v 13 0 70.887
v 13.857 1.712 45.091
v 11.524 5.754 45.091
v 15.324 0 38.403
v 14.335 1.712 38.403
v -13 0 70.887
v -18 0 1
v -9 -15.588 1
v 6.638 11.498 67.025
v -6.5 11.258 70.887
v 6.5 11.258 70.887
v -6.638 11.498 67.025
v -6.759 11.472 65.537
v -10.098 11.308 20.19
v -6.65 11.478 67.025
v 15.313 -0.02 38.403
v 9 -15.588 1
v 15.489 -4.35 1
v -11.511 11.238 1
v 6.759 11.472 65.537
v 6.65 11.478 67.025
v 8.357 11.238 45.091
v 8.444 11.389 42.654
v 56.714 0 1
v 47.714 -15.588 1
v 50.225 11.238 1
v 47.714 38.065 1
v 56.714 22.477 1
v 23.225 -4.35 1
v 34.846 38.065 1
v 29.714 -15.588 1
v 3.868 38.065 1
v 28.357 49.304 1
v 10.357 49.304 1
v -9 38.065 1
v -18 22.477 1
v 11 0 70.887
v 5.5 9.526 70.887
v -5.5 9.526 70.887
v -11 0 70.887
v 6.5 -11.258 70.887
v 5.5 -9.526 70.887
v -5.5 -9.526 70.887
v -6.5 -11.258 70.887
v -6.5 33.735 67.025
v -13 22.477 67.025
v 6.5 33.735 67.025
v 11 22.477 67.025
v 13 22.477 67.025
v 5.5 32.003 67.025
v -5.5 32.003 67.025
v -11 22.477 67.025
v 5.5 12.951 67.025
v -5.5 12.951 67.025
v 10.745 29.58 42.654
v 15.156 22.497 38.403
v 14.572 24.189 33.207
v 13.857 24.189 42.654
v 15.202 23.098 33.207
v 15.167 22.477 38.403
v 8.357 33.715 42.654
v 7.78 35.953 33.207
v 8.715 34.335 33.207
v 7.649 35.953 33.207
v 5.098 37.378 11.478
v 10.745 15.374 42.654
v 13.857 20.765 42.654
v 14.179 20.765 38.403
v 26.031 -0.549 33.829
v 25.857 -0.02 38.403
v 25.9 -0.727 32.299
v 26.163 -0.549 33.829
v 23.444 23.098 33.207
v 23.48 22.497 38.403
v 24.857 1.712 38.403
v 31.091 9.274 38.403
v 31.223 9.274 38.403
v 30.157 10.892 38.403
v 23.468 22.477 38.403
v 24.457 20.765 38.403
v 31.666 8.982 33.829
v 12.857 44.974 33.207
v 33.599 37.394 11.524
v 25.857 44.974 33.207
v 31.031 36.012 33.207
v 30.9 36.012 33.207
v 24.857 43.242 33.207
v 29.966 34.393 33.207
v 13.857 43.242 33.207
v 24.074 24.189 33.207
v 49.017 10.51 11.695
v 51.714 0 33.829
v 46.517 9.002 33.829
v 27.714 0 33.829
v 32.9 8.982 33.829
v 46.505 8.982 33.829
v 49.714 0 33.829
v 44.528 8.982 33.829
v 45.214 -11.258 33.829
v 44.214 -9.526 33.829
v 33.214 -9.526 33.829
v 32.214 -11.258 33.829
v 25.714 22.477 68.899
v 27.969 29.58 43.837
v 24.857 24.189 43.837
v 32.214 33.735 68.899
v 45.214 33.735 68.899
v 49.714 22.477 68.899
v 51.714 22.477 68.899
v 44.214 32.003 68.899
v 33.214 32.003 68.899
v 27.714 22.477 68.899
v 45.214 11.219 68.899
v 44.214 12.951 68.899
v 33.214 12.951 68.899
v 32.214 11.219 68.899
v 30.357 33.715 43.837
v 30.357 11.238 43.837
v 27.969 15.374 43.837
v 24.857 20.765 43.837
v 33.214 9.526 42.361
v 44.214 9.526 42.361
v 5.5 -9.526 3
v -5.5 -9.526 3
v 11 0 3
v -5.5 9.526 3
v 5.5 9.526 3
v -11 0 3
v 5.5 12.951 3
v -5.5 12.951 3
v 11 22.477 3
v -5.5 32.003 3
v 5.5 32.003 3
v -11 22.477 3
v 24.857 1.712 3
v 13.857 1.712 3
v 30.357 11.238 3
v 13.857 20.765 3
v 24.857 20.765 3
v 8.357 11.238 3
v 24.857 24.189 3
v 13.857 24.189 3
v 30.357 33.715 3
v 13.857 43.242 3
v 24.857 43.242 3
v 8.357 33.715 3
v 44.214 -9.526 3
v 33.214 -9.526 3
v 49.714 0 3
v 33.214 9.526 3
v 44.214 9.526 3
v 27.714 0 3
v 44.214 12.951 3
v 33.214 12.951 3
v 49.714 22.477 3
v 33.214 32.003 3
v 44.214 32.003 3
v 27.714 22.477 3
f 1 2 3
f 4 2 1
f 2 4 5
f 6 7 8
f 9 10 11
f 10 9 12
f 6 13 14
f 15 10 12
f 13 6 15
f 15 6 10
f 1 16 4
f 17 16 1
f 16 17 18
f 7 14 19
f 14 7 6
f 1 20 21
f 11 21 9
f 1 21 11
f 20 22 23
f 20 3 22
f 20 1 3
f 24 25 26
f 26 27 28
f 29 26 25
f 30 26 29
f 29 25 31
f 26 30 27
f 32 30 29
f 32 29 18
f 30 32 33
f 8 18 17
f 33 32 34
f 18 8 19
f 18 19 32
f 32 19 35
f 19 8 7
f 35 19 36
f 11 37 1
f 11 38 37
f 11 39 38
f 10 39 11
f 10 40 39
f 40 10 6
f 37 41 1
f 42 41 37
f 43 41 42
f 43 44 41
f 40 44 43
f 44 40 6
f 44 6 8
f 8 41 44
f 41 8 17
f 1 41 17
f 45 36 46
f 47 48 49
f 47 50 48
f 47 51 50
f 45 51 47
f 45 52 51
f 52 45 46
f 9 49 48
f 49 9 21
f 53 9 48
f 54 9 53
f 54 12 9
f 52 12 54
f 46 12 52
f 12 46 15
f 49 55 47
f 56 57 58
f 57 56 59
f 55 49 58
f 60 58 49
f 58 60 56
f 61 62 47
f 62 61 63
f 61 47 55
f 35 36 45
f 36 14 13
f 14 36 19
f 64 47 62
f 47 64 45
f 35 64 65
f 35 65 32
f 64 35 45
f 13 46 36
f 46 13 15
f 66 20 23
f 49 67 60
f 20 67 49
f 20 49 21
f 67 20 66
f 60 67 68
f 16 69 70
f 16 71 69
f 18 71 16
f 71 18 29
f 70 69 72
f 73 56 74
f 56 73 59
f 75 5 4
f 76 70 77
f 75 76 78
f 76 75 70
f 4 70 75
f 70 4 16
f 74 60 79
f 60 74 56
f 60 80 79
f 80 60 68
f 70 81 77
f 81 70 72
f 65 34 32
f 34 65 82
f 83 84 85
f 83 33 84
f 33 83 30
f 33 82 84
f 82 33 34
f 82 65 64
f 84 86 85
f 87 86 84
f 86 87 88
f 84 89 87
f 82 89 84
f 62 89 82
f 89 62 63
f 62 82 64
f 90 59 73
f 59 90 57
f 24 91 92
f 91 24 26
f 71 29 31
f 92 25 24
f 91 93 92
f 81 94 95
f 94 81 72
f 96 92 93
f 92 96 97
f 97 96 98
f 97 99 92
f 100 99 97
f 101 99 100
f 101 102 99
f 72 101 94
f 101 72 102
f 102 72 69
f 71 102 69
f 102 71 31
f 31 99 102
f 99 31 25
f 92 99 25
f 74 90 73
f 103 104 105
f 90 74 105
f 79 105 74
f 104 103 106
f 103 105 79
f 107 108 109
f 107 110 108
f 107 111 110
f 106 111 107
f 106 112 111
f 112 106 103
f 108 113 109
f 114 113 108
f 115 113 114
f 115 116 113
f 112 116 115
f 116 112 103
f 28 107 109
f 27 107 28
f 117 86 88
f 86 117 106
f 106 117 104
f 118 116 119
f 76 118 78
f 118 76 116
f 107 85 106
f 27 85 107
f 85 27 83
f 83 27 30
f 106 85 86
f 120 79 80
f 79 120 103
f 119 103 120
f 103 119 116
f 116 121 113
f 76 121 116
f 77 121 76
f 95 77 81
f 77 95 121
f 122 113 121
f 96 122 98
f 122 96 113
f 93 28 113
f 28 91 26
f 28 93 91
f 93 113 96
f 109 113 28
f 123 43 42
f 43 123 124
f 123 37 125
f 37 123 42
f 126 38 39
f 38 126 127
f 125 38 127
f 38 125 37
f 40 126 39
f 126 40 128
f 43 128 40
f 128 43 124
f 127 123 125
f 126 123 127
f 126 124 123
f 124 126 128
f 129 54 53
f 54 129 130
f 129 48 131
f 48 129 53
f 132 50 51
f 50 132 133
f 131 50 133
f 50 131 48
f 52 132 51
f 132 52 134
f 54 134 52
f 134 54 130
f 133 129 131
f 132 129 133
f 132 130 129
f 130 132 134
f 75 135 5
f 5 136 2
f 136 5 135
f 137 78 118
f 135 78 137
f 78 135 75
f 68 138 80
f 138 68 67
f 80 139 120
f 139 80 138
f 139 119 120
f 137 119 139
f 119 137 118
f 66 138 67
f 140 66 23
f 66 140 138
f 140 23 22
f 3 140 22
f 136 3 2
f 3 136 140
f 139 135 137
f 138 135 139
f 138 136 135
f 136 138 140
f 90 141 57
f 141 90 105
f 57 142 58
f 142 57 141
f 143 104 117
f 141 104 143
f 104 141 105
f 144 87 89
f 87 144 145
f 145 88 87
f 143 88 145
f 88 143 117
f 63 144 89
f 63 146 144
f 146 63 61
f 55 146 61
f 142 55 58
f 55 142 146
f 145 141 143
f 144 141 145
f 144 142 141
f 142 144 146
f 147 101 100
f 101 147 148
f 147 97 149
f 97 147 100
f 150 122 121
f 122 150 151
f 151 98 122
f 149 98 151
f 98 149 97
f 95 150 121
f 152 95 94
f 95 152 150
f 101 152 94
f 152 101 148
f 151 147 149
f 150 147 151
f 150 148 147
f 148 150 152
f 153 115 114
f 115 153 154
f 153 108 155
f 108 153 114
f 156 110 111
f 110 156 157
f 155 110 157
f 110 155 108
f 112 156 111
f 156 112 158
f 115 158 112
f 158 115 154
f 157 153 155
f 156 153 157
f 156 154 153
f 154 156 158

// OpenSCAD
/*

Created by Arthur Palmer 30.09.2015

*/

// Amount of tybes in the X-Direction
x_count = 3; 

// Amount of tybes in the Y-Direction
y_count = 2; 

// Random height can be changed here
random_seed = 1;

// Minimum height of the types
min_height = 30;

// Maximum height of the types
max_height = 70;

// Tybe-Radius
radius = 13;

// How thick should the wall be:
thickness = 2;

// Should it be thiker on the bottom?
base_extra = 5;

difference()
{
for ( x = [0:(x_count - 1)])
    for( y = [0:(y_count - 1)])
    {
        zy = (x % 2) * radius * 0.8645;
        translate([x * radius * 1.489, y * radius * 1.729 + zy, 1])
            createBase(rands(min_height, max_height, 1, random_seed + x + x_count * y)[0]);
    }

for ( x = [0:(x_count - 1)])
    for( y = [0:(y_count - 1)])
    {
        zy = (x % 2) * radius * 0.8645;
        translate([x * radius * 1.489, y * radius * 1.729 + zy, 1])
            createHoles(rands(min_height, max_height, 1, random_seed + x + x_count * y)[0]);
    }
}

module createBase(height)
{
    cylinder(height, radius + base_extra, radius, $fn=6);
}

module createHoles(height)
{
    translate([0, 0, thickness])
        cylinder(height+max_height, radius - thickness, radius - thickness, $fn=6);
}
